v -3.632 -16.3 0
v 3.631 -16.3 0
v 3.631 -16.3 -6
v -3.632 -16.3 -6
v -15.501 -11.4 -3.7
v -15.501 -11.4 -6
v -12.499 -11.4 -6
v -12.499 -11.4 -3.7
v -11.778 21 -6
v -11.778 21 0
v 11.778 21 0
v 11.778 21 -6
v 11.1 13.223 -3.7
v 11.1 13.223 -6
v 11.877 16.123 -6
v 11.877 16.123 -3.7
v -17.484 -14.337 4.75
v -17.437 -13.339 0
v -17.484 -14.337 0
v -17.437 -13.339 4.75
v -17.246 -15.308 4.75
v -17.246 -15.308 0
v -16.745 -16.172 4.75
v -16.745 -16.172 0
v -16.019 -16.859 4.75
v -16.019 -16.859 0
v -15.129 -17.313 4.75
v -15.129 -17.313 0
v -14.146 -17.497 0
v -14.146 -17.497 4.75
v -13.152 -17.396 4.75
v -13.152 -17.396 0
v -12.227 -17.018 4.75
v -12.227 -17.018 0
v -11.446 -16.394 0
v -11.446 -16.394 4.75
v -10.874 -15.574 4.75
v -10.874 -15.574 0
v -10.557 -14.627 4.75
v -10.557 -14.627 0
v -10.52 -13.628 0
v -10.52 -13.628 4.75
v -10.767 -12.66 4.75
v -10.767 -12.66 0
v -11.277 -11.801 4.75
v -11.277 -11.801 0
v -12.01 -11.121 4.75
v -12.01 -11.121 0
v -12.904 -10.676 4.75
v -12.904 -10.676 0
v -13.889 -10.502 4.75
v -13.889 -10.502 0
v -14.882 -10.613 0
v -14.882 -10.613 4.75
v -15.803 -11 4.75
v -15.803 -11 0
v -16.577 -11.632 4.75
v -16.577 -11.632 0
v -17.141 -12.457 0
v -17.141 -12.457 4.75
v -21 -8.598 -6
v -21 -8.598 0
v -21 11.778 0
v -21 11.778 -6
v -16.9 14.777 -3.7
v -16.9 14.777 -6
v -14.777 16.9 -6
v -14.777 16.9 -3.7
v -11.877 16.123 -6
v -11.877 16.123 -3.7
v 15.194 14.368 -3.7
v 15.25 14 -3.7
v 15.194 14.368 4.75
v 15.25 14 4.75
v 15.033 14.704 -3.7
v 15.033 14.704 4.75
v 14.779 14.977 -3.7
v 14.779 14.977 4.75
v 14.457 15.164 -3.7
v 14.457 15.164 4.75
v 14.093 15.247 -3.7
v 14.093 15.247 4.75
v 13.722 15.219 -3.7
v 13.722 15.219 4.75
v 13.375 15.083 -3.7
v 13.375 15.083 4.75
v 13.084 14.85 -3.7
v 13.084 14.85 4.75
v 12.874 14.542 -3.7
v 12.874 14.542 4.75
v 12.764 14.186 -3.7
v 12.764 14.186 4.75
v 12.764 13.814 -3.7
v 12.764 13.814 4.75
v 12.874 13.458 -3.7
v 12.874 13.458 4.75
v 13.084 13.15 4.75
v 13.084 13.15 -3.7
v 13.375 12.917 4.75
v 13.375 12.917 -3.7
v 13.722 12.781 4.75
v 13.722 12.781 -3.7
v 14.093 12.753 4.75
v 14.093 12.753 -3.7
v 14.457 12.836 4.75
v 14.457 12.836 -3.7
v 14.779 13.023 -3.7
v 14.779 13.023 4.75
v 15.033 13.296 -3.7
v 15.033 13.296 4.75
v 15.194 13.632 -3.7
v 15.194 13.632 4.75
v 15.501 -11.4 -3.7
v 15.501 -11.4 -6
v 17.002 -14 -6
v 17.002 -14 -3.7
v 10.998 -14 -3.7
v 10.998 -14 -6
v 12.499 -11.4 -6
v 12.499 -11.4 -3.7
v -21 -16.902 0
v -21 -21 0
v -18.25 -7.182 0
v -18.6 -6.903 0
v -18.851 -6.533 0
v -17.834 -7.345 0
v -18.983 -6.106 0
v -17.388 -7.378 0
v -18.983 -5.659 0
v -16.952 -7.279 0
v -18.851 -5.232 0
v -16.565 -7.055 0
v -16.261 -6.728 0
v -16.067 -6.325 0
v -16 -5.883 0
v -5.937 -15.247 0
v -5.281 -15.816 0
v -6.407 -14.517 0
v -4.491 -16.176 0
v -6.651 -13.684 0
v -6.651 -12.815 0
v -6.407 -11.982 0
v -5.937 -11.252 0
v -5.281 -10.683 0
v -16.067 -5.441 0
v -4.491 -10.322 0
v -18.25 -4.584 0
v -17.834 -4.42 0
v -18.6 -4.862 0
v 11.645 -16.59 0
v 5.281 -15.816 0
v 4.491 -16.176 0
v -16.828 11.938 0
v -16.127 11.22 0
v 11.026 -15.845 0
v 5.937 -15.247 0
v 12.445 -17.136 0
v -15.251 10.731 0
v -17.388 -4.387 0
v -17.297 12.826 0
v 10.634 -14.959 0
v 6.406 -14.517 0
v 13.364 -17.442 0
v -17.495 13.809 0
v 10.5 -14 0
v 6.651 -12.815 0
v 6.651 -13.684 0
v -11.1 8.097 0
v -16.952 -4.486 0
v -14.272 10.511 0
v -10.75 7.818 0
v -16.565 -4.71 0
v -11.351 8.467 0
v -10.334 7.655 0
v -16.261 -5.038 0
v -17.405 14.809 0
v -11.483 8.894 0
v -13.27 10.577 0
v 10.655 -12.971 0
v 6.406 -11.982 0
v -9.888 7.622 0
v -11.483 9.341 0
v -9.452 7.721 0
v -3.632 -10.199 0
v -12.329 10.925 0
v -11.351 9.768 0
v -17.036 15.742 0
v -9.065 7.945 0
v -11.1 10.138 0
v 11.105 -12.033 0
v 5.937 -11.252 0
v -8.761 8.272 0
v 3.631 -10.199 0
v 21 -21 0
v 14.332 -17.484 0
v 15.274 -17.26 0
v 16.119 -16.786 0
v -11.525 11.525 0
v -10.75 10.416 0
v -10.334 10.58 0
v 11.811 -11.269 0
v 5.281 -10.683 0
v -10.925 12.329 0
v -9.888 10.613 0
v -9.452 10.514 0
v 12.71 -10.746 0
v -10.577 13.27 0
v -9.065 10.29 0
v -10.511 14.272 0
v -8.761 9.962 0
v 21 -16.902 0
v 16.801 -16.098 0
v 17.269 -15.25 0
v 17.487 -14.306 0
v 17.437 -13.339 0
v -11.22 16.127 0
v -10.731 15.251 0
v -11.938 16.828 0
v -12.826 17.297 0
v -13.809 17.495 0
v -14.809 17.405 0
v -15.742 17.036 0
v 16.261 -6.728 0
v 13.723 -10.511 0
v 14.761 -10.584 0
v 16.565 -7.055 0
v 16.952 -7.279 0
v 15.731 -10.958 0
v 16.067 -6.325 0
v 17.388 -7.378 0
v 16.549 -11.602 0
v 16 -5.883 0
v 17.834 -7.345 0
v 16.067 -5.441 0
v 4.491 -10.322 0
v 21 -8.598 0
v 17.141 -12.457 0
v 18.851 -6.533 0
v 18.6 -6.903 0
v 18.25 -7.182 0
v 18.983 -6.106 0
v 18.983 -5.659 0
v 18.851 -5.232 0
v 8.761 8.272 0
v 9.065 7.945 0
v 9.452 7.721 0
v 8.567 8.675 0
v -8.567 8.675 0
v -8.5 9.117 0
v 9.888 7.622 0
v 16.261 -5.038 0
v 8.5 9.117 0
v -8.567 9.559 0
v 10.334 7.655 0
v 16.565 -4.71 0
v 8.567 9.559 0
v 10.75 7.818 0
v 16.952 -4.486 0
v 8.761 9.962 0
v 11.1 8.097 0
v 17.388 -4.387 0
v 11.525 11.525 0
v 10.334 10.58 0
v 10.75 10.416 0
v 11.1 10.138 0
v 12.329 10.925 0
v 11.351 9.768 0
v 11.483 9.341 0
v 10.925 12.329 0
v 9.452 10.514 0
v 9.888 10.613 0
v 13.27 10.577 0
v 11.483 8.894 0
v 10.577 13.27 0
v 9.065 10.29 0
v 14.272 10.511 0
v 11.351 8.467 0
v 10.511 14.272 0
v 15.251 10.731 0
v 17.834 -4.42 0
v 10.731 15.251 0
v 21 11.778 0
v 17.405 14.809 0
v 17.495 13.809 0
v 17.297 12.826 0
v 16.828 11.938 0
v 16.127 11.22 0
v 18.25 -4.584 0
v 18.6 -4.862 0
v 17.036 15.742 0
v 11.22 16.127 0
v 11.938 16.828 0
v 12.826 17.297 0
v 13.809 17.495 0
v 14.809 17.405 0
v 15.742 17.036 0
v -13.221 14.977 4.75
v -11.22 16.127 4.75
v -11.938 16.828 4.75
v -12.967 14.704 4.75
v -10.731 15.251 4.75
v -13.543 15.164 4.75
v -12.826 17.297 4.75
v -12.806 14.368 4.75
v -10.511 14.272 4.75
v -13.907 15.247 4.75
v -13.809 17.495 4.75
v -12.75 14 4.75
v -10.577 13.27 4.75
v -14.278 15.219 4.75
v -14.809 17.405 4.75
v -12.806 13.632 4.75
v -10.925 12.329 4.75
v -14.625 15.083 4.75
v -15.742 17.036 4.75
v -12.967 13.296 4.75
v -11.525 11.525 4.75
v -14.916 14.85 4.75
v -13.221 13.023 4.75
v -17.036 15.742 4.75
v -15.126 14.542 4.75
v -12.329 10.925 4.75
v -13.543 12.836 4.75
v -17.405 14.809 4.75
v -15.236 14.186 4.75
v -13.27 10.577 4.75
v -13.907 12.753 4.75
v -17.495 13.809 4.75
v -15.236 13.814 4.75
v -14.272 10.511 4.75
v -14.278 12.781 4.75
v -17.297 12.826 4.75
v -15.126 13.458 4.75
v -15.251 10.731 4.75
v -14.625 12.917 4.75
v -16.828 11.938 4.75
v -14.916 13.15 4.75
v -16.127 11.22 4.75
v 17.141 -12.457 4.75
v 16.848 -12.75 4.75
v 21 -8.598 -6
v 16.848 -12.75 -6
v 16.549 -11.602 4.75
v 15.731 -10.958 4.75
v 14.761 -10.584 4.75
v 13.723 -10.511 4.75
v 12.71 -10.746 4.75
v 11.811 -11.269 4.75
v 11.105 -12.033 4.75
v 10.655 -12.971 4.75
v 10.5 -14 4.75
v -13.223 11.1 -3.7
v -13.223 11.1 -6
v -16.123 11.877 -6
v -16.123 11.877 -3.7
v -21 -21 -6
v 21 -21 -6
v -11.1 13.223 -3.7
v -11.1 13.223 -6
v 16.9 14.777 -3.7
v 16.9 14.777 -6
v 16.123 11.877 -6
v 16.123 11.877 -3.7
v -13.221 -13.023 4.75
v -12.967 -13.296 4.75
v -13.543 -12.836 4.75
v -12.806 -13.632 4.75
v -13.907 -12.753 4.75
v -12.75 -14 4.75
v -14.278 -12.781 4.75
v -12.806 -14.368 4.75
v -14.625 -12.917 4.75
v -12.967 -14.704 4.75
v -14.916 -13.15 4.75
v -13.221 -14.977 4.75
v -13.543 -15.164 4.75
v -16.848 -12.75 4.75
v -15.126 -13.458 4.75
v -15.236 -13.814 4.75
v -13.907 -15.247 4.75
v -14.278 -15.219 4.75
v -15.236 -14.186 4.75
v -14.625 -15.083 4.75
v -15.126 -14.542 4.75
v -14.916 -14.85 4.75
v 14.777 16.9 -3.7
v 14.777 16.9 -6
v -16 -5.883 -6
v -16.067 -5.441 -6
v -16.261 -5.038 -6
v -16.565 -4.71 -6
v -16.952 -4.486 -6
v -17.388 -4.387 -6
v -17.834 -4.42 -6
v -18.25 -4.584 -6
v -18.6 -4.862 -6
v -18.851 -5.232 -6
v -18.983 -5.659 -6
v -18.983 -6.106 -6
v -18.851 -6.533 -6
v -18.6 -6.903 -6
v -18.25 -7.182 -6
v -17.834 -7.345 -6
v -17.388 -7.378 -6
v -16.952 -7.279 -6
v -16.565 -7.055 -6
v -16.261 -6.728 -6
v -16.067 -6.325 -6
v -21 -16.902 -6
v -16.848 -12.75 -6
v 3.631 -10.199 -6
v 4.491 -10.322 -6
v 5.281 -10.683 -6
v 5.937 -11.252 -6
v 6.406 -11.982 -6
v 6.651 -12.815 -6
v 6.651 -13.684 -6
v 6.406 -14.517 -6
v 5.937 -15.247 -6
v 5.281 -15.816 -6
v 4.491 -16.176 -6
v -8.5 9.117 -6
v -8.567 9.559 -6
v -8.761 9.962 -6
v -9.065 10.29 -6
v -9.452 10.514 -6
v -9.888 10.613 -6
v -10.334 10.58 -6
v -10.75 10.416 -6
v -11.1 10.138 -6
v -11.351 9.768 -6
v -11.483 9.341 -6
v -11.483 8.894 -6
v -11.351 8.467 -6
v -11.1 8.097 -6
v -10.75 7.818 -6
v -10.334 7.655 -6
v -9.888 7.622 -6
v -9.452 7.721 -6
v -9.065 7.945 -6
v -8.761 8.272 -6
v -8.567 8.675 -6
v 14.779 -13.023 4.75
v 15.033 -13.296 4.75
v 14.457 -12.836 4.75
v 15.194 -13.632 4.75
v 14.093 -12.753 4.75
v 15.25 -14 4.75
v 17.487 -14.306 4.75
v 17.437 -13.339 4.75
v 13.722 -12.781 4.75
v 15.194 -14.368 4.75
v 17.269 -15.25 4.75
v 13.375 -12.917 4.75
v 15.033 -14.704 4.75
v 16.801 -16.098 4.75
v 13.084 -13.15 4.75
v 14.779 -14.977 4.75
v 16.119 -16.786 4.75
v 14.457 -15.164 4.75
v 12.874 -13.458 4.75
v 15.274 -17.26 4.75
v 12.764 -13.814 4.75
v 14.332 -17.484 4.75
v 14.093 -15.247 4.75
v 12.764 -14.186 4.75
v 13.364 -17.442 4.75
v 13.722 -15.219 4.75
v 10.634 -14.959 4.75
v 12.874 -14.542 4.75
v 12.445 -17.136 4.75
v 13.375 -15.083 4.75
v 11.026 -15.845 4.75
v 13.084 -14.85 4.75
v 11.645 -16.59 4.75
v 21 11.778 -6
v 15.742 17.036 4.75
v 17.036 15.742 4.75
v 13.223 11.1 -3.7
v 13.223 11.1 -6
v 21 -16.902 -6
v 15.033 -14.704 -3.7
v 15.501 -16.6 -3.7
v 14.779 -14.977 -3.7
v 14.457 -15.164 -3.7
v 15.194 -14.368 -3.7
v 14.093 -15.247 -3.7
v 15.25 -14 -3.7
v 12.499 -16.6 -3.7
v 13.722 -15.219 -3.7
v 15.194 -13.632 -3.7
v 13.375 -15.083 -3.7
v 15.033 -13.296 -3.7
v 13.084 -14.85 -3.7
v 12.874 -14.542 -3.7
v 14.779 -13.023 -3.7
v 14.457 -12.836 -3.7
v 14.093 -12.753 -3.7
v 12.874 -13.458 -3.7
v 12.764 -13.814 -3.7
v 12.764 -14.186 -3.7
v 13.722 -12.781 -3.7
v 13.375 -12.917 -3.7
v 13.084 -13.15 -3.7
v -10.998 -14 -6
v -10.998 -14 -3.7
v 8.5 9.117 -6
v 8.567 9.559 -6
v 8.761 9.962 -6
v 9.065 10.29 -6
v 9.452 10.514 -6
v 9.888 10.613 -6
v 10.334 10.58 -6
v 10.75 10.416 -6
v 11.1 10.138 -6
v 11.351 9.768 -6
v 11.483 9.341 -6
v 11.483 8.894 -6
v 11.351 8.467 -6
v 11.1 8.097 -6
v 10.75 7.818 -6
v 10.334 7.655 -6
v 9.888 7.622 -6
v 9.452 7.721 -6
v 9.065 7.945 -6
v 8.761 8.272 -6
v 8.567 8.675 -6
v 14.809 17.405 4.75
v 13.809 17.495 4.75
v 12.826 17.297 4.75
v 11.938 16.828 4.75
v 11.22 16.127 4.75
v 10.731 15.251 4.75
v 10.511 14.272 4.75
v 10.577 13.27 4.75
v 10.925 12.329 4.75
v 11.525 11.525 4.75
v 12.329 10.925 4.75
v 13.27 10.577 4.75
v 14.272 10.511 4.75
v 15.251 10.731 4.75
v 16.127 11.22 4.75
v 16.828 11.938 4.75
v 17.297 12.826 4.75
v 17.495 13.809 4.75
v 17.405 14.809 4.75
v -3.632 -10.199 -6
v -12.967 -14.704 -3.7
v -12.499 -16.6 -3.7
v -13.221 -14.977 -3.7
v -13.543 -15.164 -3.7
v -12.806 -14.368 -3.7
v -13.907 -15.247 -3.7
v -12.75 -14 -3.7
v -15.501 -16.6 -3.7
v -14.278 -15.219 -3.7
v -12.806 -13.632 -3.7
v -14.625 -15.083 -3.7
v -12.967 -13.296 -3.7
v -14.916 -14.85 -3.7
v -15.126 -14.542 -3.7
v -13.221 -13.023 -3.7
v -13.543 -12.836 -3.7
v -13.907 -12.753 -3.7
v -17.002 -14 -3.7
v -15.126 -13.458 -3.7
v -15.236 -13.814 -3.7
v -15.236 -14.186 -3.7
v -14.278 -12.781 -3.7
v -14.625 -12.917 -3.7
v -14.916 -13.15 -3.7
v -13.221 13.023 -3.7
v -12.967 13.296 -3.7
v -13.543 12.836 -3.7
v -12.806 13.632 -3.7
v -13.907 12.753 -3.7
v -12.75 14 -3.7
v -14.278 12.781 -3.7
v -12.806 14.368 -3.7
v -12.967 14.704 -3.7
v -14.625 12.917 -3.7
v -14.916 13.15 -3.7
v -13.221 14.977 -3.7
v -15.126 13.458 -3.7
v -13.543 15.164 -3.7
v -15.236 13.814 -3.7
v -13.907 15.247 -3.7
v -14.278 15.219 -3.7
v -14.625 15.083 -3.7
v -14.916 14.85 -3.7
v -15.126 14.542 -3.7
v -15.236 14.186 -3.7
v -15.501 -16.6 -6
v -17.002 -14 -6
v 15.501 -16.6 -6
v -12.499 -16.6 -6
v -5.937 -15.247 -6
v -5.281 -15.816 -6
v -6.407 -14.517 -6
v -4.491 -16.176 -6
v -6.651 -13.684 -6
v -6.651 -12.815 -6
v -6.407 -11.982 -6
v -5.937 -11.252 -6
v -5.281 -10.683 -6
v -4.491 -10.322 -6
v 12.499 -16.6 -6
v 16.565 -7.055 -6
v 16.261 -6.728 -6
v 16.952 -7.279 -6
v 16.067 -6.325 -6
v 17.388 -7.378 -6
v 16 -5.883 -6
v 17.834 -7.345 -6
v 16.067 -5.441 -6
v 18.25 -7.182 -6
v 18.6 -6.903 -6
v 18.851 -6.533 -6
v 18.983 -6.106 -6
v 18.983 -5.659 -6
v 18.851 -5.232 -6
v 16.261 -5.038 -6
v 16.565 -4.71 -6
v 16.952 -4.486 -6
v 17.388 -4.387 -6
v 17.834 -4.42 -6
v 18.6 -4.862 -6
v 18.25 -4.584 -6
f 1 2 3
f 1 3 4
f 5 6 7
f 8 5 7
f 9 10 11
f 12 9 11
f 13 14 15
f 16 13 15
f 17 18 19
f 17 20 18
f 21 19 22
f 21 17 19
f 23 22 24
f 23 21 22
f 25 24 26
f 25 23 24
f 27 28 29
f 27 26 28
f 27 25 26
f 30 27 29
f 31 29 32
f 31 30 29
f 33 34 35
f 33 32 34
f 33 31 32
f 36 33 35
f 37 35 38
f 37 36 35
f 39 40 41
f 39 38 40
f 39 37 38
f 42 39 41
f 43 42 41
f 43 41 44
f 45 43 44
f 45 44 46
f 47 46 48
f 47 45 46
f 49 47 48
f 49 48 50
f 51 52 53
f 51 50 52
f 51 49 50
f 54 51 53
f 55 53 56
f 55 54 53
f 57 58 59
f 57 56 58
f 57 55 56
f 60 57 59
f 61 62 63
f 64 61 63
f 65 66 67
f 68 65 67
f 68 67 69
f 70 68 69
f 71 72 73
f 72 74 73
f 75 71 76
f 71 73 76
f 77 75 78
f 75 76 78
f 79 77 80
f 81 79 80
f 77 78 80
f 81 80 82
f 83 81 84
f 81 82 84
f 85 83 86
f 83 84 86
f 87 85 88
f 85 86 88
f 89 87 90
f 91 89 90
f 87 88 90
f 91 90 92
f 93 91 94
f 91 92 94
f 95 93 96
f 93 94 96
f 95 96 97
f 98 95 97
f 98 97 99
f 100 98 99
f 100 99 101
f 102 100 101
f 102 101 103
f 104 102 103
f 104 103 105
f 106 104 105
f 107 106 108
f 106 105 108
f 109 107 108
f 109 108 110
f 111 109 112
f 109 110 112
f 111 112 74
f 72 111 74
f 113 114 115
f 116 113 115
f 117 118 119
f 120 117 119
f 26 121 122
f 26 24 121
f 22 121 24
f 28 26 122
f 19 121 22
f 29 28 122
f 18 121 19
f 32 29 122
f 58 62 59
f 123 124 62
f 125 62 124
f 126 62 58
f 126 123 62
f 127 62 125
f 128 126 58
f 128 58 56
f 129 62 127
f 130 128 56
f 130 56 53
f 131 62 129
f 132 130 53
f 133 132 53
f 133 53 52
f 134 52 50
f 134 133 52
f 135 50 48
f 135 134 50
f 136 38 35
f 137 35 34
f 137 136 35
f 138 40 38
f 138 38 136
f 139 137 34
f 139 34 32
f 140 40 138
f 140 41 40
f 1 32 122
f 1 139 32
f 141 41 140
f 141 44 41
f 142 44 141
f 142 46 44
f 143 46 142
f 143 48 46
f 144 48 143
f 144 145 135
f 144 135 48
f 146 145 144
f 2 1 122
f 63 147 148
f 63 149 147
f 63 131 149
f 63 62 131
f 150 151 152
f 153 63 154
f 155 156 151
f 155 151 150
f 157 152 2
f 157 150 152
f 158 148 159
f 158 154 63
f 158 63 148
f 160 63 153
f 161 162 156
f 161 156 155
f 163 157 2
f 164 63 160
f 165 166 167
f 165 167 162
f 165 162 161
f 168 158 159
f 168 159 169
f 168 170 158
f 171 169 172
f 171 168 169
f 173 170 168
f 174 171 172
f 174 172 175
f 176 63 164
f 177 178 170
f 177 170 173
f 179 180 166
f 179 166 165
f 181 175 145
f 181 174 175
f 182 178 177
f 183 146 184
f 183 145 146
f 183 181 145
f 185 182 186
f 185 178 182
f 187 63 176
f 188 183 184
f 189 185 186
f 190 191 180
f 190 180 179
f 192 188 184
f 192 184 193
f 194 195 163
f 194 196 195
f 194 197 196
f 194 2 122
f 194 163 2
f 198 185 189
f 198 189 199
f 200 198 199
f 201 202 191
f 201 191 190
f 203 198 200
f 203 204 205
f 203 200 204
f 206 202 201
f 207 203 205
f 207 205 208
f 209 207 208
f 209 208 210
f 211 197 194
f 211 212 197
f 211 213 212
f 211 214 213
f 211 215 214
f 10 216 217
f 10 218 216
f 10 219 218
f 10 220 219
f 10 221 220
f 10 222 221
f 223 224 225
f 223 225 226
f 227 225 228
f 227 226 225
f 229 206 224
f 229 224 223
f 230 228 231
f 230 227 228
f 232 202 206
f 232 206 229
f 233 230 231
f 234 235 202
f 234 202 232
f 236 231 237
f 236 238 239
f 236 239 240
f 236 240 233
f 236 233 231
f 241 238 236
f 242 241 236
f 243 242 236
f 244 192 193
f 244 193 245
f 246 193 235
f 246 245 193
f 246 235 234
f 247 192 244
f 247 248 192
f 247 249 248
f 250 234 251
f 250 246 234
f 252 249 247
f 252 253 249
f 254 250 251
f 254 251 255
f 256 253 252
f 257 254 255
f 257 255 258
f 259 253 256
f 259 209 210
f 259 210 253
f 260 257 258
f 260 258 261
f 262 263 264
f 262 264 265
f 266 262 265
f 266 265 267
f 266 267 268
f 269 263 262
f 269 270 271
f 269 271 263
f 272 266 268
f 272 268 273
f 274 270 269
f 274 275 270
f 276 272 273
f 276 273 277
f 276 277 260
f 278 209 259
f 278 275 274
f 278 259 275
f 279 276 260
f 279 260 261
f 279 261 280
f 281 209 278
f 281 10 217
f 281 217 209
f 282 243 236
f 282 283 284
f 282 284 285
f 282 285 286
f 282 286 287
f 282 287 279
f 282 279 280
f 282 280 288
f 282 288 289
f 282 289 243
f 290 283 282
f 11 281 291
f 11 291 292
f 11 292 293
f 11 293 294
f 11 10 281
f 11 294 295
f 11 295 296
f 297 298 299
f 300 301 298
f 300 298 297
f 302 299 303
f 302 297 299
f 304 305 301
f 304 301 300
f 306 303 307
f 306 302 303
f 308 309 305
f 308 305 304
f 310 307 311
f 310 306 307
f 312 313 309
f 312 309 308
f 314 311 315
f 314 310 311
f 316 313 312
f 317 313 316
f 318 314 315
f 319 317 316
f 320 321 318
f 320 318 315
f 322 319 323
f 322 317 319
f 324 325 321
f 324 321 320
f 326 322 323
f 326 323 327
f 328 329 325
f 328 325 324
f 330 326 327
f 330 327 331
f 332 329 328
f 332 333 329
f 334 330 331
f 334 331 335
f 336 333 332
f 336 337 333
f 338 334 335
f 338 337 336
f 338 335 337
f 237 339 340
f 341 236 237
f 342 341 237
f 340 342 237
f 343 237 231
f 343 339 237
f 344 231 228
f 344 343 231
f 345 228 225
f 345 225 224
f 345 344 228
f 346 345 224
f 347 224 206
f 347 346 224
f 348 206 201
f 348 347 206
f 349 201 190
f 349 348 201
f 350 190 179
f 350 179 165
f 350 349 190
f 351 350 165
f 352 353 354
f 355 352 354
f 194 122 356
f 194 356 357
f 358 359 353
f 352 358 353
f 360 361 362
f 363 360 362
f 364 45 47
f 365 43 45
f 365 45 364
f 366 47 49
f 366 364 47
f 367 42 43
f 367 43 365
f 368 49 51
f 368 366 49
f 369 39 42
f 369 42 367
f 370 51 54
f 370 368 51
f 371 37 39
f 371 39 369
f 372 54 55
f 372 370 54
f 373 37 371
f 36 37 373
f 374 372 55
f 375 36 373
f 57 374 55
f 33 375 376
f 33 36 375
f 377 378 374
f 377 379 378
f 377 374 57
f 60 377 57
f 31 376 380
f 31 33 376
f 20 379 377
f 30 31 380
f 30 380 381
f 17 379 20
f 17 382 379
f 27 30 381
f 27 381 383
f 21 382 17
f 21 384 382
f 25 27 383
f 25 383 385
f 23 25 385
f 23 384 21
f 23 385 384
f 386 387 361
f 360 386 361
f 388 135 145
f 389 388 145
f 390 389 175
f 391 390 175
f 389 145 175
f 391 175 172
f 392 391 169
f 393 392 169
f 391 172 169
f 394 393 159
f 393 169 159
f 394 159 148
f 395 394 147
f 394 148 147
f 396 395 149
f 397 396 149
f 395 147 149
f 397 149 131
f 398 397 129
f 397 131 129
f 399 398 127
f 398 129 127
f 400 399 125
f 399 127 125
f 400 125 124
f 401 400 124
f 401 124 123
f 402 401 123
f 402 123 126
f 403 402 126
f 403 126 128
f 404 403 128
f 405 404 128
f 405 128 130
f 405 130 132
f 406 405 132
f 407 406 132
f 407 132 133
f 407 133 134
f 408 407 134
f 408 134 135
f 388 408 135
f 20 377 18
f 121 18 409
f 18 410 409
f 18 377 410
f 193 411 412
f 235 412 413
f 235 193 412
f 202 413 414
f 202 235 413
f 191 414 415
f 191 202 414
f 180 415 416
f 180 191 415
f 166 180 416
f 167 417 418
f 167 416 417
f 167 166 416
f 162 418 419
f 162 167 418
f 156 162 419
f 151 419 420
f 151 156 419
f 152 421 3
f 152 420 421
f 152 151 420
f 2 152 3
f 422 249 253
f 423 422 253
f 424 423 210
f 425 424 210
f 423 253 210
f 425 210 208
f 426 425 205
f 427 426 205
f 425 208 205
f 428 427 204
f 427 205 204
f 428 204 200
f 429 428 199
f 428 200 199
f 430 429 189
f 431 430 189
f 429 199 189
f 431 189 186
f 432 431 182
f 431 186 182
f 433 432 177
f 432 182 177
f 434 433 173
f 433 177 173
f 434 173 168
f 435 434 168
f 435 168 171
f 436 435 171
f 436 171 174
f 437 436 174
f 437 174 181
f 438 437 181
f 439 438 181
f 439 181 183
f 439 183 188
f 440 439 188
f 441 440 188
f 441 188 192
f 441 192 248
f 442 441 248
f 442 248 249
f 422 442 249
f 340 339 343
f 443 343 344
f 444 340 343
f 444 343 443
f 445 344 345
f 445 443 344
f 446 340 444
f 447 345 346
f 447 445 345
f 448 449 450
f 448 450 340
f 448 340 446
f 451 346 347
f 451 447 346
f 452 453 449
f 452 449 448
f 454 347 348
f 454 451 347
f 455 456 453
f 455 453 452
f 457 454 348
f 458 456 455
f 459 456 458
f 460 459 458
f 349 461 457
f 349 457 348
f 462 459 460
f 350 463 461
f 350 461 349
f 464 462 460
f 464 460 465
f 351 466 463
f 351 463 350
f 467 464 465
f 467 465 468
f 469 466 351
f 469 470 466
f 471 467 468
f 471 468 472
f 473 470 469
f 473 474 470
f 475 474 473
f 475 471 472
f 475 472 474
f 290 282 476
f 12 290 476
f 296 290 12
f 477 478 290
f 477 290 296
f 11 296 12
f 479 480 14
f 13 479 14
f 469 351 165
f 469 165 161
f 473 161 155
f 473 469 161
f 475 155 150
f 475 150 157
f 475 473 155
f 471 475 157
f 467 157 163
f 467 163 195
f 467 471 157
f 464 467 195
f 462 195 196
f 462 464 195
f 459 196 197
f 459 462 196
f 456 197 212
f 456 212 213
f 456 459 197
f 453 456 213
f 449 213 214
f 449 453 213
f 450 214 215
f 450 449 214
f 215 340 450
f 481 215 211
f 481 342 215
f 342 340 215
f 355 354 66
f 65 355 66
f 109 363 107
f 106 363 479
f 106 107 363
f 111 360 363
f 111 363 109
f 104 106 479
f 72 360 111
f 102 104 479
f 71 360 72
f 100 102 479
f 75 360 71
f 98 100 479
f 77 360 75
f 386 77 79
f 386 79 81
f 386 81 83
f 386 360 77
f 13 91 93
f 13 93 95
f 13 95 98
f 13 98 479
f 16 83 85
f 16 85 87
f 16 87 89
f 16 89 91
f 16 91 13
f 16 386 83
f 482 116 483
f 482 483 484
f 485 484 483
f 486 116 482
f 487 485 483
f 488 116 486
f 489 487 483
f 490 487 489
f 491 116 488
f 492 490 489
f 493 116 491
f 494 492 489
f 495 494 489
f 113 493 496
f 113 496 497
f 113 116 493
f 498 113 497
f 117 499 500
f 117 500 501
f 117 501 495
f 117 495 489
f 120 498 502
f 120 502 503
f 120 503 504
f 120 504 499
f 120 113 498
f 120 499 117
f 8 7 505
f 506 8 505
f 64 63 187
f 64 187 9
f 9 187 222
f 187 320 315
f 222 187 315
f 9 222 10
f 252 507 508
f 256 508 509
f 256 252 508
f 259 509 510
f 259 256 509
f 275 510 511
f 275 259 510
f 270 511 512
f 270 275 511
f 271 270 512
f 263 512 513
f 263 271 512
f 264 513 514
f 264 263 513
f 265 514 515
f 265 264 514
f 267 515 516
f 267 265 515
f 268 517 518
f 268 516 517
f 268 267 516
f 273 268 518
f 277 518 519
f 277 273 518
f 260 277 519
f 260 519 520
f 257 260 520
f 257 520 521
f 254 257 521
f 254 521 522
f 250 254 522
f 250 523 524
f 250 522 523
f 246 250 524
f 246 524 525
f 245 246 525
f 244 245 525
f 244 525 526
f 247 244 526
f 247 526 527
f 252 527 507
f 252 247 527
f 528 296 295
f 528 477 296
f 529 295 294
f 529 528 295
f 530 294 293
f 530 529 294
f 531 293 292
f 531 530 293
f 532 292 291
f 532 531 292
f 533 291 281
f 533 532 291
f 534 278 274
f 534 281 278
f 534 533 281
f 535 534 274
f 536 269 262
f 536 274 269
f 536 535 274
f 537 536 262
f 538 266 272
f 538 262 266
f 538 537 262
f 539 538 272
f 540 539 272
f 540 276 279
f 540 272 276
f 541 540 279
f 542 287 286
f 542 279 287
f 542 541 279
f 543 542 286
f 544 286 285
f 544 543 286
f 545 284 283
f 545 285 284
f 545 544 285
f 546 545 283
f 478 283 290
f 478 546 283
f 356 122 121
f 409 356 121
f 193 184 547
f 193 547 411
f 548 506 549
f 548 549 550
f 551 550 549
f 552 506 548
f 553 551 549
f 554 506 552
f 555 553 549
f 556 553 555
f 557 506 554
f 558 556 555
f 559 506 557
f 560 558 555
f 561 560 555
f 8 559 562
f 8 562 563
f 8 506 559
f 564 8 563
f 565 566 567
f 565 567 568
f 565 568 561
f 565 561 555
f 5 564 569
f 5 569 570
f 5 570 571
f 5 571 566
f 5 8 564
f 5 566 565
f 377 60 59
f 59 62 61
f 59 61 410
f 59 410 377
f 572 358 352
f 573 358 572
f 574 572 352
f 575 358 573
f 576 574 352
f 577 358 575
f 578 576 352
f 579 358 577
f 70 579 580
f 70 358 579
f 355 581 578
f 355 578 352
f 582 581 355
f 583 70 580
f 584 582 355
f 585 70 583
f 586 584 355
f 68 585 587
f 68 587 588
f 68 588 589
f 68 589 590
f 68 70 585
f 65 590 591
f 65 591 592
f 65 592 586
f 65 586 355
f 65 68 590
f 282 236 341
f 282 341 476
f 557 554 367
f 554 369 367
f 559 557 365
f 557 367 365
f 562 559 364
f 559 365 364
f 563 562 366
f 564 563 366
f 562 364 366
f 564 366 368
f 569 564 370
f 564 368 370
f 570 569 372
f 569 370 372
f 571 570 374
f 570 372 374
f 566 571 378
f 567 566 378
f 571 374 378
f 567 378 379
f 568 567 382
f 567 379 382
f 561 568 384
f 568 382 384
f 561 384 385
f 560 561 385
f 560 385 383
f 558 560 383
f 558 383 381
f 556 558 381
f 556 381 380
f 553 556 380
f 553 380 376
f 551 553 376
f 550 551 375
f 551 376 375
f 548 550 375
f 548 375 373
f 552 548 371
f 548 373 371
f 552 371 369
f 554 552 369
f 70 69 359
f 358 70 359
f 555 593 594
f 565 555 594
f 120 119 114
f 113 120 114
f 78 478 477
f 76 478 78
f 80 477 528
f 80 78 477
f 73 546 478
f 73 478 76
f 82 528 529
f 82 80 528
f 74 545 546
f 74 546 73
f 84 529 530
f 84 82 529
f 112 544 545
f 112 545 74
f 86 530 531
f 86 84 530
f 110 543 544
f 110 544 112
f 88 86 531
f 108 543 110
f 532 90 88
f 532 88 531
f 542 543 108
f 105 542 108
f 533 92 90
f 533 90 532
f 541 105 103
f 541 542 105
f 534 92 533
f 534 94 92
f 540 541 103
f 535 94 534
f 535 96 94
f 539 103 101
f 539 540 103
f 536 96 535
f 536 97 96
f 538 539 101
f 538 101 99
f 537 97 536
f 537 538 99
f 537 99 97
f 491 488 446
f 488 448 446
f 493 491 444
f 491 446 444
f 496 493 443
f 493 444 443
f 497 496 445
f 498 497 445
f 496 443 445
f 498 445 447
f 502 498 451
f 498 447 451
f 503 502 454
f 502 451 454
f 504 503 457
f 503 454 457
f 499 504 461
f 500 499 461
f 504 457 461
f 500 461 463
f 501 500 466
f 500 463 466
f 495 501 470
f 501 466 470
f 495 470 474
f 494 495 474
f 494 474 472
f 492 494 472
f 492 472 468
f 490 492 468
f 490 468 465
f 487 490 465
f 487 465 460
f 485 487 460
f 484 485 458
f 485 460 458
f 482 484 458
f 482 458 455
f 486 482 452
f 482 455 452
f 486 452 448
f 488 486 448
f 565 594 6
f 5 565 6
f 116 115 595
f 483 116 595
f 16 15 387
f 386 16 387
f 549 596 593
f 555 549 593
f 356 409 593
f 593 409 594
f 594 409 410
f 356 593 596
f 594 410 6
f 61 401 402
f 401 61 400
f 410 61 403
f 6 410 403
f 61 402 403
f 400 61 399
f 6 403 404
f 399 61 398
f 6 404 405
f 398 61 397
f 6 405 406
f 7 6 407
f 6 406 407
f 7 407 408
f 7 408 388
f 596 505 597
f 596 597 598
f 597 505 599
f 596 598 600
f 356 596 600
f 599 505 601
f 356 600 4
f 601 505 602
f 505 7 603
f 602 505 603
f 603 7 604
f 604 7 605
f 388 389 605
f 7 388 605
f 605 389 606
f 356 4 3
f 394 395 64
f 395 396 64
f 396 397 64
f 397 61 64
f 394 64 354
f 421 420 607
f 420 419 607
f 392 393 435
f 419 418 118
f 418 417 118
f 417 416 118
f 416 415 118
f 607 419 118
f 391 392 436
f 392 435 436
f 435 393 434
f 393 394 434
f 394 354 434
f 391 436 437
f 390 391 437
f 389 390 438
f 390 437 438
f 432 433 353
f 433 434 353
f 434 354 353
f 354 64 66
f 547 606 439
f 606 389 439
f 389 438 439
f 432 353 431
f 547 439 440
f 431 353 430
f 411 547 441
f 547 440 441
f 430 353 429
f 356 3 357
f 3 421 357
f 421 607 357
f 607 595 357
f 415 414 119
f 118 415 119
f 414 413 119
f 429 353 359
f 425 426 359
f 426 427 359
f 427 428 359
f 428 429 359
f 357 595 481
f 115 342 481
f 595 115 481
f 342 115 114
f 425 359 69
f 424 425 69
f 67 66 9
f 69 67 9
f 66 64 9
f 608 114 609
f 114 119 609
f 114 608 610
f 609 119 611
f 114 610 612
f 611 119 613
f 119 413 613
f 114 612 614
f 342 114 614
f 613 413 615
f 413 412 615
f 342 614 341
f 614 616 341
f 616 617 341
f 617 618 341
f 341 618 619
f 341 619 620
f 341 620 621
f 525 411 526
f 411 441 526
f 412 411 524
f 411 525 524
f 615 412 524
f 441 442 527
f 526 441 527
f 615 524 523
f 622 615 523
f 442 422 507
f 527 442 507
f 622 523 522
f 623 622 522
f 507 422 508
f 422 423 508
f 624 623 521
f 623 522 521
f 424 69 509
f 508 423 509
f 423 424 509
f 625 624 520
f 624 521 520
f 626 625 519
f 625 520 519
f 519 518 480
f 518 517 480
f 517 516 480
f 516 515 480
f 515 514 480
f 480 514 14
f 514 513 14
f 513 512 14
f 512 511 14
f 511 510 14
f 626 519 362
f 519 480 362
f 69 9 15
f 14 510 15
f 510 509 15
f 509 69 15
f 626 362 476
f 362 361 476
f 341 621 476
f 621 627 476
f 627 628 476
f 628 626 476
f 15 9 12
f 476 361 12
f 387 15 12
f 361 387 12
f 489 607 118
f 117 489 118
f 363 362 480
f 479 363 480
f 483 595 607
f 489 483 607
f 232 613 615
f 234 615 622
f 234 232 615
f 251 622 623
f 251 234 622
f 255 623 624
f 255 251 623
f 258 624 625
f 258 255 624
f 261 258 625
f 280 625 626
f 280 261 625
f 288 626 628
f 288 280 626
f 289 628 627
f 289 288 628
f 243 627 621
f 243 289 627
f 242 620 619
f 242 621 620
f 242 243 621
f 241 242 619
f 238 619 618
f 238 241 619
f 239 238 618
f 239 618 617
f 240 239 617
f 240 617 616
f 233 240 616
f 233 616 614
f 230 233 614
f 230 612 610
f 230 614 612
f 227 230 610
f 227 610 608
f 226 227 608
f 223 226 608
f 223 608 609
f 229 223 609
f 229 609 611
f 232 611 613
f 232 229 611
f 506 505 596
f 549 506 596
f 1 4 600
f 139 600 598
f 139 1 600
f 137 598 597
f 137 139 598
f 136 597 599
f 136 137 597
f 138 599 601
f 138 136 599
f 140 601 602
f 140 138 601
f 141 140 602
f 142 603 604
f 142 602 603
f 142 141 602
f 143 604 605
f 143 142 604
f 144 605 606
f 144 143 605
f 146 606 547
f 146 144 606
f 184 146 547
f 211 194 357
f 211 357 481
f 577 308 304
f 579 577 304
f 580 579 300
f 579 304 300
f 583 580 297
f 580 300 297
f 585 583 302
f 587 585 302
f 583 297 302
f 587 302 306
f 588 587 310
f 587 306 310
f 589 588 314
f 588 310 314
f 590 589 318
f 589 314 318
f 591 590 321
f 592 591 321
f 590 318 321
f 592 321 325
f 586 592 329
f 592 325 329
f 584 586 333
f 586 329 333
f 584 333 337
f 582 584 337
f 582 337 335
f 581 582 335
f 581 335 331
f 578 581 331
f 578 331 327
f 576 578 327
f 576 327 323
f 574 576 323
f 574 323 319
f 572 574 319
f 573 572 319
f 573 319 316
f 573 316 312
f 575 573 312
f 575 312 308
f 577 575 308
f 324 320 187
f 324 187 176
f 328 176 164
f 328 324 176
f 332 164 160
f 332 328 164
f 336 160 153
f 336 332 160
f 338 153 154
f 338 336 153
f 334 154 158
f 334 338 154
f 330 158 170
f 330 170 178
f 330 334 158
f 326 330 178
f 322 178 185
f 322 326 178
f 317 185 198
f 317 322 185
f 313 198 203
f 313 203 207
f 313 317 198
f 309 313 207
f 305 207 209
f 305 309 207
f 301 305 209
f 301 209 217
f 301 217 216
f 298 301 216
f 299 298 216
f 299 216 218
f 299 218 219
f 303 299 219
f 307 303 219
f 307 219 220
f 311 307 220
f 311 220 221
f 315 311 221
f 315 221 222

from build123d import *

# Parameters (mm, degrees)
SKETCH1_W           = 42
SKETCH1_H           = 42
SKETCH1_R           = 1.25
BOSS_EXTRUDE1_DEPTH = 6
CUT_EXTRUDE1_DEPTH  = 31.298514815
BOSS_EXTRUDE2_START = 4.75
SKETCH3_R           = 3.5
SKETCH3_R_2         = 1.25
BOSS_EXTRUDE2_DEPTH = 4.75
SKETCH4_R           = 1.5
CUT_EXTRUDE2_DEPTH  = 31.298514815
CUT_EXTRUDE3_DEPTH  = 2.3


with BuildPart() as part:
    # Sketch1 → Boss-Extrude1 (new body)
    with BuildSketch(Plane.XY):
        Rectangle(SKETCH1_W, SKETCH1_H)
        with Locations((-14, 14)):
            Circle(SKETCH1_R, mode=Mode.SUBTRACT)
        with Locations((14, 14)):
            Circle(SKETCH1_R, mode=Mode.SUBTRACT)
        with Locations((14, -14)):
            Circle(SKETCH1_R, mode=Mode.SUBTRACT)
        with Locations((-14, -14)):
            Circle(SKETCH1_R, mode=Mode.SUBTRACT)
    extrude(amount=-BOSS_EXTRUDE1_DEPTH)

    # Sketch2 → Cut-Extrude1 (cut, through all)
    with BuildSketch(Plane.XY):
        with BuildLine():
            Line((-3.631627179, -10.198790609), (3.631230455, -10.198790609))
            ThreePointArc((3.631230455, -10.198790609), (6.681814195, -13.249374349), (3.631230455, -16.29995809))
            Line((3.631230455, -16.29995809), (-3.631627179, -16.29995809))
            ThreePointArc((-3.631627179, -16.29995809), (-6.68221092, -13.249374349), (-3.631627179, -10.198790609))
        make_face()
    extrude(amount=-CUT_EXTRUDE1_DEPTH, mode=Mode.SUBTRACT)

    # Sketch3 → Boss-Extrude2 (add)
    # profile 1 of 4: a face of its own
    with BuildSketch(Plane.XY.offset(BOSS_EXTRUDE2_START)):
        with Locations(Location((-14, 14, 0), (0, 0, 180))):
            Circle(SKETCH3_R)
        with Locations((-14, 14)):
            Circle(SKETCH3_R_2, mode=Mode.SUBTRACT)
    # profile 2 of 4: a face of its own
    with BuildSketch(Plane.XY.offset(BOSS_EXTRUDE2_START)):
        with Locations(Location((14, 14, 0), (0, 0, 180))):
            Circle(SKETCH3_R)
        with Locations((14, 14)):
            Circle(SKETCH3_R_2, mode=Mode.SUBTRACT)
    # profile 3 of 4: a face of its own
    with BuildSketch(Plane.XY.offset(BOSS_EXTRUDE2_START)):
        with Locations(Location((-14, -14, 0), (0, 0, 180))):
            Circle(SKETCH3_R)
        with Locations((-14, -14)):
            Circle(SKETCH3_R_2, mode=Mode.SUBTRACT)
    # profile 4 of 4: a face of its own
    with BuildSketch(Plane.XY.offset(BOSS_EXTRUDE2_START)):
        with Locations(Location((14, -14, 0), (0, 0, 180))):
            Circle(SKETCH3_R)
        with Locations((14, -14)):
            Circle(SKETCH3_R_2, mode=Mode.SUBTRACT)
    extrude(amount=-BOSS_EXTRUDE2_DEPTH)

    # Sketch4 → Cut-Extrude2 (cut, symmetric)
    with BuildSketch(Plane.XY):
        with Locations((-17.5, -5.882662859)):
            Circle(SKETCH4_R)
        with Locations((-10, 9.117337141)):
            Circle(SKETCH4_R)
        Polygon((-21.661099187, -7.93704977), (-16.848148957, -12.75), (-21.661099187, -17.56295023), align=None)
        Polygon((-21.705309187, 11.072359515), (-11.305917145, 21.471751558), (-21.705309187, 21.471751558), align=None)
    cut_extrude2 = extrude(amount=CUT_EXTRUDE2_DEPTH, both=True, mode=Mode.SUBTRACT)

    # Mirror1: Cut-Extrude2 across plane
    add(cut_extrude2.mirror(Plane(origin=(0, 0, 0), x_dir=(0, 0, 1), z_dir=(1, 0, 0))), mode=Mode.SUBTRACT)

    # Sketch5 → Cut-Extrude3 (cut)
    with BuildSketch(Plane(origin=(0, 0, -6), x_dir=(-1, 0, 0), z_dir=(0, 0, -1))):
        Polygon((-13.222967924, 11.100076814), (-11.100076814, 13.222967924), (-11.87710889, 16.12289111), (-14.777032076, 16.899923186), (-16.899923186, 14.777032076), (-16.12289111, 11.87710889), align=None)
        Polygon((13.222967924, 11.100076814), (16.12289111, 11.87710889), (16.899923186, 14.777032076), (14.777032076, 16.899923186), (11.87710889, 16.12289111), (11.100076814, 13.222967924), align=None)
        Polygon((15.5011107, -16.6), (17.0022214, -14), (15.5011107, -11.4), (12.4988893, -11.4), (10.9977786, -14), (12.4988893, -16.6), align=None)
        Polygon((-15.5011107, -16.6), (-12.4988893, -16.6), (-10.9977786, -14), (-12.4988893, -11.4), (-15.5011107, -11.4), (-17.0022214, -14), align=None)
    extrude(amount=-CUT_EXTRUDE3_DEPTH, mode=Mode.SUBTRACT)


solid = part.part
